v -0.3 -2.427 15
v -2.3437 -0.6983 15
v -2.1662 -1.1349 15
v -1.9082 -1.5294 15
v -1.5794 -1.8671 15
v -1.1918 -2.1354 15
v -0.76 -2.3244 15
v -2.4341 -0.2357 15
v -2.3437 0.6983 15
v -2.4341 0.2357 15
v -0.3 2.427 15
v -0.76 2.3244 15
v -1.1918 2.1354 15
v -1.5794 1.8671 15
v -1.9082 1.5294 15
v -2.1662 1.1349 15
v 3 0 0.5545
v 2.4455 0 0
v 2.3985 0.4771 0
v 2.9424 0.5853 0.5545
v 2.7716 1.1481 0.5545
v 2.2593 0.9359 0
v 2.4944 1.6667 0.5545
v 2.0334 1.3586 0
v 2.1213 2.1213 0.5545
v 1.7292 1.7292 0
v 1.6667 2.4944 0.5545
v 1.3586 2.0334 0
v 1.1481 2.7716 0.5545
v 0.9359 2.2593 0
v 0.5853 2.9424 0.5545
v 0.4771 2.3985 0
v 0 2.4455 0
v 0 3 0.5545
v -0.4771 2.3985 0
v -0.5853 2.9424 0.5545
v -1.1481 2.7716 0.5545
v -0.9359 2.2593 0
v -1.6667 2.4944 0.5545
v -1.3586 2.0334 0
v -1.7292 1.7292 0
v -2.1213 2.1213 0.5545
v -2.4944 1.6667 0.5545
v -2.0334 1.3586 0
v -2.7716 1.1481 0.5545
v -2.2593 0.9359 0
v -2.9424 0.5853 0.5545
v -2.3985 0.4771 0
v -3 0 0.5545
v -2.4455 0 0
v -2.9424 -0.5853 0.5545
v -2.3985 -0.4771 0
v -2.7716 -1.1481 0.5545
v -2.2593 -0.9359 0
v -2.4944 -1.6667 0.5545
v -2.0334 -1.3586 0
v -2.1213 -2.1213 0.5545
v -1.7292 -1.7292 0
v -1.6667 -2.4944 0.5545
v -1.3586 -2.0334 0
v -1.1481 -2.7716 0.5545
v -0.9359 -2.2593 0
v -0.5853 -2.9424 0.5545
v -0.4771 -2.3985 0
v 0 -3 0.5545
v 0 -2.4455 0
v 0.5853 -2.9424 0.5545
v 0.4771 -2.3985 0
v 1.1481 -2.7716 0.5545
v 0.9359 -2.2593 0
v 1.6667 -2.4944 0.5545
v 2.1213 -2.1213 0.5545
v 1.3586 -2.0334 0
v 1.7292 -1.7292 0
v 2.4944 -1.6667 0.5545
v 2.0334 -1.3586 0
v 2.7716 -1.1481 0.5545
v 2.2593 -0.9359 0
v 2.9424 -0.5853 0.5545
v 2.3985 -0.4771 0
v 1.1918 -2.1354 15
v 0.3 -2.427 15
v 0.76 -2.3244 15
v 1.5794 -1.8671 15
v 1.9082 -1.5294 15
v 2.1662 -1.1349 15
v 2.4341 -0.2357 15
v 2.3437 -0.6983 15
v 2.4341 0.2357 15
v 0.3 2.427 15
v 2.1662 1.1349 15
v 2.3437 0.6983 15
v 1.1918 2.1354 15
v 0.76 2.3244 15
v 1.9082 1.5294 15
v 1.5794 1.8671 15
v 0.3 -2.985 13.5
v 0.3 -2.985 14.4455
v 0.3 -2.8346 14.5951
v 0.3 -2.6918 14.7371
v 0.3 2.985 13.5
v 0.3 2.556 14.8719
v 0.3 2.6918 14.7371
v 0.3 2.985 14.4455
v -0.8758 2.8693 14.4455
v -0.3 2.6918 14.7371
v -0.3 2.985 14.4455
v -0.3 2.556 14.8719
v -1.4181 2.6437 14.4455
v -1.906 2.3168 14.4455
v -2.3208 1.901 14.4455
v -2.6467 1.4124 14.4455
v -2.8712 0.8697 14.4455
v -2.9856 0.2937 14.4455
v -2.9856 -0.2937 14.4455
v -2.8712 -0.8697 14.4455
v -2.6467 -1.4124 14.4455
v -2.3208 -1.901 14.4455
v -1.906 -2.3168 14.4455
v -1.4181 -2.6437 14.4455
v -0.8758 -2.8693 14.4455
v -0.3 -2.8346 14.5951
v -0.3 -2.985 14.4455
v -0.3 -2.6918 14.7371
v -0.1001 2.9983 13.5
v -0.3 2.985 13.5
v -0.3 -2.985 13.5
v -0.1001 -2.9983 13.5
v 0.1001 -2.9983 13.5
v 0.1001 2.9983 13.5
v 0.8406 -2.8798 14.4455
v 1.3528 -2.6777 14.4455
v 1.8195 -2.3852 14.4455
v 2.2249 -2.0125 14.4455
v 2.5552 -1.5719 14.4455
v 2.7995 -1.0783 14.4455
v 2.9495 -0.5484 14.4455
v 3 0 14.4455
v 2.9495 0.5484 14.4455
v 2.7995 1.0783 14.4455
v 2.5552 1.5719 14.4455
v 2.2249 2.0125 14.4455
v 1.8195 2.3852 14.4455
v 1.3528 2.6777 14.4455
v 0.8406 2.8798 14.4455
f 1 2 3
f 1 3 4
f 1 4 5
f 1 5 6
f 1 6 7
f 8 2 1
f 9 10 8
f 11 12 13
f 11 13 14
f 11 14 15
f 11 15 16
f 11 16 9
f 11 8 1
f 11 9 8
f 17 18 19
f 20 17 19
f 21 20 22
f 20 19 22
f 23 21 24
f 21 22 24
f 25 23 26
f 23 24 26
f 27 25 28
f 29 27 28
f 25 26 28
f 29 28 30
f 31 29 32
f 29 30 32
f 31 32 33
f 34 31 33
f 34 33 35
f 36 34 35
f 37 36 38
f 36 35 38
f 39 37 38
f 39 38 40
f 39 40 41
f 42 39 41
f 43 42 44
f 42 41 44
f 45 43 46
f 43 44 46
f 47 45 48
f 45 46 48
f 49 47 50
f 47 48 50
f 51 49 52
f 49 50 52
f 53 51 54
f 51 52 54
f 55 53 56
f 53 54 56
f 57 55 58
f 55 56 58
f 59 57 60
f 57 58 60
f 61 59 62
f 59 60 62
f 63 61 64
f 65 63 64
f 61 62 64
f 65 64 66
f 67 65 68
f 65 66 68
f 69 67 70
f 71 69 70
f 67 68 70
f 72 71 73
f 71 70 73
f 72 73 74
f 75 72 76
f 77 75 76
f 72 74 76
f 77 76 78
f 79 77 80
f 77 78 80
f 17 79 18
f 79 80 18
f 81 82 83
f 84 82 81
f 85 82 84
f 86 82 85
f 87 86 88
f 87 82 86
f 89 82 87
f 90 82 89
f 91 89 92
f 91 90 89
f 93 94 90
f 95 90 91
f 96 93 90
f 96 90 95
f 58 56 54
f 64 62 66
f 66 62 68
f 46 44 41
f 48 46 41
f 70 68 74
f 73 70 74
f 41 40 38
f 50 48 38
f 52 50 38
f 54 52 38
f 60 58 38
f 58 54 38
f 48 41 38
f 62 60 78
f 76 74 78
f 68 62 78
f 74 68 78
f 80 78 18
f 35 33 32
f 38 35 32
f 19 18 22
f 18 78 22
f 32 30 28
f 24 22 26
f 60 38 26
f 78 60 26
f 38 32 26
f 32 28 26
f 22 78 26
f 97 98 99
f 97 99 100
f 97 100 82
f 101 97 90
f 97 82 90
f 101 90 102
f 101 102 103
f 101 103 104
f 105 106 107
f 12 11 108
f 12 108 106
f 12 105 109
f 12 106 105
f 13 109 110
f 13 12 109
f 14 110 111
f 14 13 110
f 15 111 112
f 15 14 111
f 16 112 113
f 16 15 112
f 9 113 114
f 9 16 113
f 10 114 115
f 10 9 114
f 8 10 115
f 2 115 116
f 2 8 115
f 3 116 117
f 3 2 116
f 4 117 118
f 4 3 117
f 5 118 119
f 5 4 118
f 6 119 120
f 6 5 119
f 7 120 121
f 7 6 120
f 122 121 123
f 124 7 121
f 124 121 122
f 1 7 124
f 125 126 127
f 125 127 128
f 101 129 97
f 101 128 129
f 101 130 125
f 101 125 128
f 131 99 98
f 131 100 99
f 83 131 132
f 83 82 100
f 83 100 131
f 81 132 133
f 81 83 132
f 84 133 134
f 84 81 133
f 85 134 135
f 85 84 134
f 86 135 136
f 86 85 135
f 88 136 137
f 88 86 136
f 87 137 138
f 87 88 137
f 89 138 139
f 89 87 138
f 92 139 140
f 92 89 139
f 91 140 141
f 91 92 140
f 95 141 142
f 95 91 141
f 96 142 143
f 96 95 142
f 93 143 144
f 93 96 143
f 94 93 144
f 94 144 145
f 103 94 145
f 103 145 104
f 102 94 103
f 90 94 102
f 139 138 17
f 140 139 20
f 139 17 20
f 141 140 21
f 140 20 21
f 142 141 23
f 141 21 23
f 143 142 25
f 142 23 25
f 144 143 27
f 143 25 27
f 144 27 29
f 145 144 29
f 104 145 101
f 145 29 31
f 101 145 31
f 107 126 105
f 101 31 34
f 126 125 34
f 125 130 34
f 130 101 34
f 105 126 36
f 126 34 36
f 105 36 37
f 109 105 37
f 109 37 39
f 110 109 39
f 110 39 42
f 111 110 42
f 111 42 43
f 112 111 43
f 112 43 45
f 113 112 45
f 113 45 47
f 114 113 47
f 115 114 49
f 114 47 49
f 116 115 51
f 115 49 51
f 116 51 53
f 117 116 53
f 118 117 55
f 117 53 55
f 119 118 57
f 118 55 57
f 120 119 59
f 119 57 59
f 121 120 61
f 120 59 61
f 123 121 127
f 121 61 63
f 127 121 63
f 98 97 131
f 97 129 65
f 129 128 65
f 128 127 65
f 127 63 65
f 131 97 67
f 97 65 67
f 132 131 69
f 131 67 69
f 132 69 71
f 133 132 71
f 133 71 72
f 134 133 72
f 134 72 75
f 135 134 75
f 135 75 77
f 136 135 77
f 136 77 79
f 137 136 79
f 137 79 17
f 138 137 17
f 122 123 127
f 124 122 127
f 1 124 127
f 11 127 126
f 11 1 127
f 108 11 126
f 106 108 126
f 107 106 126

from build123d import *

# Parameters (mm, degrees)
SKETCH_1_R          = 3
EXTRUDE_1_DEPTH     = 15
CHAMFER_1_SIZE      = 0.5545
SKETCH_2_W          = 0.6
SKETCH_2_H          = 7
CUT_EXTRUDE_1_DEPTH = 1.5


with BuildPart() as part:
    # Эскиз1 → Бобышка-Вытянуть1 (new body)
    with BuildSketch(Plane.XY):
        Circle(SKETCH_1_R)
    extrude(amount=EXTRUDE_1_DEPTH)

    # Фаска1
    chamfer_1_edges = [part.edges().sort_by_distance(p)[0] for p in [
        (-3, 0, 0),
        (-3, 0, 15),
    ]]
    chamfer(chamfer_1_edges, length=CHAMFER_1_SIZE)

    # Эскиз2 → Вырез-Вытянуть1 (cut)
    with BuildSketch(Plane.XY.offset(15)):
        Rectangle(SKETCH_2_W, SKETCH_2_H)
    extrude(amount=-CUT_EXTRUDE_1_DEPTH, mode=Mode.SUBTRACT)


solid = part.part
